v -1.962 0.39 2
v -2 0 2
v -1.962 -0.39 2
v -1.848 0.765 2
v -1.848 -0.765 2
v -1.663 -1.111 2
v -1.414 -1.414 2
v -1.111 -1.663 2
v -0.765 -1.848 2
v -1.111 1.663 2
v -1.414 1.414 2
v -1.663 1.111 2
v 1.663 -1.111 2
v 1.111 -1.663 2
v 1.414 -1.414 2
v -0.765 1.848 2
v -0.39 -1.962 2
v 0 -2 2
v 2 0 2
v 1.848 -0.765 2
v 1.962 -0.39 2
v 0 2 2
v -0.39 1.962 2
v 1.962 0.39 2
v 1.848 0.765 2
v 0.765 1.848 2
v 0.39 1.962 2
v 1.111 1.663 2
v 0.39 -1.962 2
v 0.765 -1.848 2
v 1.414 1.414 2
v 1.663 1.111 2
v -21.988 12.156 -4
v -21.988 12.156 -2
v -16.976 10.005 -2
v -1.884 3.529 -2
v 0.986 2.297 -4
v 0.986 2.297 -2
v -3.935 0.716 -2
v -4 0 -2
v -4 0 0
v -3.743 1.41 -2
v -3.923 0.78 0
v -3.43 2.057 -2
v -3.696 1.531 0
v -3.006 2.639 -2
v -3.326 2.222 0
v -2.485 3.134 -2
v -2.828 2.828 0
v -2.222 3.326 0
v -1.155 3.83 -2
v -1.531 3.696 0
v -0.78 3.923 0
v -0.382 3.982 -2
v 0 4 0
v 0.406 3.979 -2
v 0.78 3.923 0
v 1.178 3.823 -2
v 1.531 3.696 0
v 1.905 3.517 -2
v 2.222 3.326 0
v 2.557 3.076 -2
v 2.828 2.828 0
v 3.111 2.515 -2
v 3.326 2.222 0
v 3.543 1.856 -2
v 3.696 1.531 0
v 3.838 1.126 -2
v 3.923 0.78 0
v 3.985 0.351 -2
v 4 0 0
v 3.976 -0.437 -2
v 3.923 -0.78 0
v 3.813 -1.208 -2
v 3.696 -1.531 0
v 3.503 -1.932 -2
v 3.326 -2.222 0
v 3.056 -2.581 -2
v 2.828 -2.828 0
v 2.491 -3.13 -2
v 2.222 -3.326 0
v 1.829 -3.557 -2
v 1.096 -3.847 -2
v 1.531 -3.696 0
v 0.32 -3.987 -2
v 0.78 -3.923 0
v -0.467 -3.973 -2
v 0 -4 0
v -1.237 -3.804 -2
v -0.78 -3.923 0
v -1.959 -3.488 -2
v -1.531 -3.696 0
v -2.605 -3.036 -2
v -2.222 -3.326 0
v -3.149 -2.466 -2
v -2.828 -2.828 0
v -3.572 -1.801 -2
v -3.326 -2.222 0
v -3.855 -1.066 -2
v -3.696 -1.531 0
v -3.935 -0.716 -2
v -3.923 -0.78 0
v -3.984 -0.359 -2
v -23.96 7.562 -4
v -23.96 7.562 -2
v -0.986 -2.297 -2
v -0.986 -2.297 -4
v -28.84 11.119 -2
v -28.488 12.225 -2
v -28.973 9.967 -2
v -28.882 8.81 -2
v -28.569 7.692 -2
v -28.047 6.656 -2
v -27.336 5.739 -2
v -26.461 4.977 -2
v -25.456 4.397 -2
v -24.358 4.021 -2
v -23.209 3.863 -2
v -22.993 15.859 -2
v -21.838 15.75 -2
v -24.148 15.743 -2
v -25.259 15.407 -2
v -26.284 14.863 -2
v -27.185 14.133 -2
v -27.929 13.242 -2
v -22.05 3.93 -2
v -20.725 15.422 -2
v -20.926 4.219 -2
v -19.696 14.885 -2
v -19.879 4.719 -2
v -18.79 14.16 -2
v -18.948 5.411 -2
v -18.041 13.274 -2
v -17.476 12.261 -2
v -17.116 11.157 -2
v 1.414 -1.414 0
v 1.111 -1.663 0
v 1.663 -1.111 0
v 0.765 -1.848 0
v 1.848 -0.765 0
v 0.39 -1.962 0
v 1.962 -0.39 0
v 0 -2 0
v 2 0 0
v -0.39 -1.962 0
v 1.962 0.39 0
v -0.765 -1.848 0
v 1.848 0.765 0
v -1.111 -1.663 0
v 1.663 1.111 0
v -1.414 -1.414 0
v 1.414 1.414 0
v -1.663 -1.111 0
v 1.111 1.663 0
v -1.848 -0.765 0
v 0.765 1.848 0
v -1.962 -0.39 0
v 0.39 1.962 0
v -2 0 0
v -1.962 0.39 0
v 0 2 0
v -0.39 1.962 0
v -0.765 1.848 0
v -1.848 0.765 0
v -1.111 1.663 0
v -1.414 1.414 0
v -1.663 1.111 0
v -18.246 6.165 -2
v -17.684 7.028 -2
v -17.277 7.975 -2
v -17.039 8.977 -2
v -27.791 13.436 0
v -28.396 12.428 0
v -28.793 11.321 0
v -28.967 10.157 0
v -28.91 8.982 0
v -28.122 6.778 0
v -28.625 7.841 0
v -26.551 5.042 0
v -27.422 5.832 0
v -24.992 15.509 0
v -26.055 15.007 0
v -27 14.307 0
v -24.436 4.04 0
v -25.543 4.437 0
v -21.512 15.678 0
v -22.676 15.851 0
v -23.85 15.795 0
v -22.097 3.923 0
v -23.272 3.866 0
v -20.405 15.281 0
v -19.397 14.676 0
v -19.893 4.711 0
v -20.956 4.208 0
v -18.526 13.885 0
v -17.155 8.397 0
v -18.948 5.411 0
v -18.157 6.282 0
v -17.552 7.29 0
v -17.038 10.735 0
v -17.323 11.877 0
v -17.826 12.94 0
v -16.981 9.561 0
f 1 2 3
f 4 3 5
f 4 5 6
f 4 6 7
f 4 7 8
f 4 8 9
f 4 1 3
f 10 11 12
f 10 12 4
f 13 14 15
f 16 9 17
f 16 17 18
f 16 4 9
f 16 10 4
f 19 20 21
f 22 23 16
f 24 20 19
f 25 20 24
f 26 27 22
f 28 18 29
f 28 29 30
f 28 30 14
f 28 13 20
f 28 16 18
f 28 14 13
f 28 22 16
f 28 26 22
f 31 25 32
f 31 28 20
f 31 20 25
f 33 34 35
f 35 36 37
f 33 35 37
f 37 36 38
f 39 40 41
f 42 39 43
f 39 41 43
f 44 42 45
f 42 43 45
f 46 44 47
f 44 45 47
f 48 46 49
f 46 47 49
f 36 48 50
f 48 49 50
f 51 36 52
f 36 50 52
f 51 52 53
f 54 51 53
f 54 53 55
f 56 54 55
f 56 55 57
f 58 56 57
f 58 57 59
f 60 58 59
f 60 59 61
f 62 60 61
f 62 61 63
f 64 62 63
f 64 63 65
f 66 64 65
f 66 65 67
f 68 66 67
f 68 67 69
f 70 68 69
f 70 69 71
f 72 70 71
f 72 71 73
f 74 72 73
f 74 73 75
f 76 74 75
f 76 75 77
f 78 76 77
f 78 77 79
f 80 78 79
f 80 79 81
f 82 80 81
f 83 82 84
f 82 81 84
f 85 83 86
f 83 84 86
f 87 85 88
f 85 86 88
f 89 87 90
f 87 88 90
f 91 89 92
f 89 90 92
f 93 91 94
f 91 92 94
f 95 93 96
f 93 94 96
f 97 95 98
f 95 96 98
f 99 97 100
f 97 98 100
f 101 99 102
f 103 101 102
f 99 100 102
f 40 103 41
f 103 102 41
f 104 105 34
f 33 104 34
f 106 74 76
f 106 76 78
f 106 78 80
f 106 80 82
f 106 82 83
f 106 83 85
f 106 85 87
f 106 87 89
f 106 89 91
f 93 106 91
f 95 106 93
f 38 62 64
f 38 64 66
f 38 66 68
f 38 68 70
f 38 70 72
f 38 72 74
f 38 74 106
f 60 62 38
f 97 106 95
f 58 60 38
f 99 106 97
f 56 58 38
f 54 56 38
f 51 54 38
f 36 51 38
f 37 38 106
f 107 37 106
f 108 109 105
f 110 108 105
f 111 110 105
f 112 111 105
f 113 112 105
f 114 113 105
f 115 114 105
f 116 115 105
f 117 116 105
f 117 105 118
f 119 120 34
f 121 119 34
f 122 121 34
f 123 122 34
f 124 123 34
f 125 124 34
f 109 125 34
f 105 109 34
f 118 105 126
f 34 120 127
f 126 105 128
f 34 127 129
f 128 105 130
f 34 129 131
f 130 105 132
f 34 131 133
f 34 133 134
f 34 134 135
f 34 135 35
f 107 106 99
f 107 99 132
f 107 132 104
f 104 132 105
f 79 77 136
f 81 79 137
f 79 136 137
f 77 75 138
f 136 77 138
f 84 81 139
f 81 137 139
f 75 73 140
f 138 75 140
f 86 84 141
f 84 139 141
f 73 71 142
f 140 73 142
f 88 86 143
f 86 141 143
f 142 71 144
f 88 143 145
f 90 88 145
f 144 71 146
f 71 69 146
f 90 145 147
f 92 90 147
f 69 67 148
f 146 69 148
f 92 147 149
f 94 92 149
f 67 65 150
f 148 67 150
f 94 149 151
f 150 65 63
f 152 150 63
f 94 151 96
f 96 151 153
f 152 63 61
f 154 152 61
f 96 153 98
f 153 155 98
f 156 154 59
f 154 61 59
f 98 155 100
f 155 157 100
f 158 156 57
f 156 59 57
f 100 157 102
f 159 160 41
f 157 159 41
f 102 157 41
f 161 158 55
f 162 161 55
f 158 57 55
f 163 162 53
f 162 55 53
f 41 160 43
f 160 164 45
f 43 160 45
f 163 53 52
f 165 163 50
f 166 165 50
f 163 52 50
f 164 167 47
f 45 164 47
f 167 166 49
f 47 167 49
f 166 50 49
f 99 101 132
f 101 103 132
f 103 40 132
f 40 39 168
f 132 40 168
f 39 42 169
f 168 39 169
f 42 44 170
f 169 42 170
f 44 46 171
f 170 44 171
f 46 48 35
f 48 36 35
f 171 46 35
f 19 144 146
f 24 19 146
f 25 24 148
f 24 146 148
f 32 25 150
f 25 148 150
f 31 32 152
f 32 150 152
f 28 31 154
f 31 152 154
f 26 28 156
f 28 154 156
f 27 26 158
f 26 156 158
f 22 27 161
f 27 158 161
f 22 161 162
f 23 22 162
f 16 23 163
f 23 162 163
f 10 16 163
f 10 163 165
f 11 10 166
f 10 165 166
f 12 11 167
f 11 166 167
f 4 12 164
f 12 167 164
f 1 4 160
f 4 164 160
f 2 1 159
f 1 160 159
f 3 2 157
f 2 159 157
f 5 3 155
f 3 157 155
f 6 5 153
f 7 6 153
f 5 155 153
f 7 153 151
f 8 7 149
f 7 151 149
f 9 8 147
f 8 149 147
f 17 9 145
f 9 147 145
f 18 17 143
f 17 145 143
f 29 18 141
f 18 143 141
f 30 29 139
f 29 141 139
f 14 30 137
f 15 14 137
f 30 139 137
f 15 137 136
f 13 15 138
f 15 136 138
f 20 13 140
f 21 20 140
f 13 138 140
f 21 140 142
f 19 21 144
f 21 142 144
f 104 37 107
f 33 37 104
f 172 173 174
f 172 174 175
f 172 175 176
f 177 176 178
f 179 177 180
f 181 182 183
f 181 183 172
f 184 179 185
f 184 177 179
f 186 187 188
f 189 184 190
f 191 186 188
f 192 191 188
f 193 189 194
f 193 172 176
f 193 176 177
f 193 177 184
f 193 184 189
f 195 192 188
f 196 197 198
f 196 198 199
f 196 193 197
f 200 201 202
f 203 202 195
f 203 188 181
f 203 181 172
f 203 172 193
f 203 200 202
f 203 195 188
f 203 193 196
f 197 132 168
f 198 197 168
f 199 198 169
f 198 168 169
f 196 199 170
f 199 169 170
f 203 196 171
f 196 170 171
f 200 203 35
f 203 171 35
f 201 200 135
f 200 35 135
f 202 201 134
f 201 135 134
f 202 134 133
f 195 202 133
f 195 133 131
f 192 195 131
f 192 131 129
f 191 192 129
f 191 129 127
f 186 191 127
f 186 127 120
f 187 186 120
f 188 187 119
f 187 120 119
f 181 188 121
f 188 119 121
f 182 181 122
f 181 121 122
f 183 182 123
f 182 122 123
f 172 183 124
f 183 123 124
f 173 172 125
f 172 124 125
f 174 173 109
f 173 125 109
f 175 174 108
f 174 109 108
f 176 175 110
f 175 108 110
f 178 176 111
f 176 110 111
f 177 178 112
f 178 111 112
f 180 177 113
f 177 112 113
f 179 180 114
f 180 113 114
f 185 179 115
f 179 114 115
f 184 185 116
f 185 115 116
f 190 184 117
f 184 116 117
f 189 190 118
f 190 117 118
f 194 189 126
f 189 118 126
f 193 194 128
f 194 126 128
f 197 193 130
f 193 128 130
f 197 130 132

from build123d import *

# Parameters (mm, degrees)
SKETCH1_R           = 2
BOSS_EXTRUDE1_DEPTH = 2
SKETCH2_R           = 4
BOSS_EXTRUDE2_DEPTH = 2
BOSS_EXTRUDE3_DEPTH = 2
SKETCH4_R           = 6
BOSS_EXTRUDE4_DEPTH = 2


with BuildPart() as part:
    # Sketch1 → Boss-Extrude1 (new body)
    with BuildSketch(Plane.XY):
        Circle(SKETCH1_R)
    extrude(amount=BOSS_EXTRUDE1_DEPTH)

    # Sketch2 → Boss-Extrude2 (add)
    with BuildSketch(Plane(origin=(0, 0, 0), x_dir=(-1, 0, 0), z_dir=(0, 0, -1))):
        Circle(SKETCH2_R)
    extrude(amount=BOSS_EXTRUDE2_DEPTH)

    # Sketch3 → Boss-Extrude3 (add)
    with BuildSketch(Plane(origin=(0, 0, -2), x_dir=(-1, 0, 0), z_dir=(0, 0, -1))):
        Polygon((21.988055025, 12.156292042), (-0.985889756, 2.297394478), (0.985889756, -2.297394478), (23.959834538, 7.561503086), align=None)
    extrude(amount=BOSS_EXTRUDE3_DEPTH)

    # Sketch4 → Boss-Extrude4 (add)
    with BuildSketch(Plane.XY.offset(-2)):
        with Locations(Location((-22.973944782, 9.858897564, 0), (0, 0, 312.149872239))):
            Circle(SKETCH4_R)
    extrude(amount=BOSS_EXTRUDE4_DEPTH)


solid = part.part
